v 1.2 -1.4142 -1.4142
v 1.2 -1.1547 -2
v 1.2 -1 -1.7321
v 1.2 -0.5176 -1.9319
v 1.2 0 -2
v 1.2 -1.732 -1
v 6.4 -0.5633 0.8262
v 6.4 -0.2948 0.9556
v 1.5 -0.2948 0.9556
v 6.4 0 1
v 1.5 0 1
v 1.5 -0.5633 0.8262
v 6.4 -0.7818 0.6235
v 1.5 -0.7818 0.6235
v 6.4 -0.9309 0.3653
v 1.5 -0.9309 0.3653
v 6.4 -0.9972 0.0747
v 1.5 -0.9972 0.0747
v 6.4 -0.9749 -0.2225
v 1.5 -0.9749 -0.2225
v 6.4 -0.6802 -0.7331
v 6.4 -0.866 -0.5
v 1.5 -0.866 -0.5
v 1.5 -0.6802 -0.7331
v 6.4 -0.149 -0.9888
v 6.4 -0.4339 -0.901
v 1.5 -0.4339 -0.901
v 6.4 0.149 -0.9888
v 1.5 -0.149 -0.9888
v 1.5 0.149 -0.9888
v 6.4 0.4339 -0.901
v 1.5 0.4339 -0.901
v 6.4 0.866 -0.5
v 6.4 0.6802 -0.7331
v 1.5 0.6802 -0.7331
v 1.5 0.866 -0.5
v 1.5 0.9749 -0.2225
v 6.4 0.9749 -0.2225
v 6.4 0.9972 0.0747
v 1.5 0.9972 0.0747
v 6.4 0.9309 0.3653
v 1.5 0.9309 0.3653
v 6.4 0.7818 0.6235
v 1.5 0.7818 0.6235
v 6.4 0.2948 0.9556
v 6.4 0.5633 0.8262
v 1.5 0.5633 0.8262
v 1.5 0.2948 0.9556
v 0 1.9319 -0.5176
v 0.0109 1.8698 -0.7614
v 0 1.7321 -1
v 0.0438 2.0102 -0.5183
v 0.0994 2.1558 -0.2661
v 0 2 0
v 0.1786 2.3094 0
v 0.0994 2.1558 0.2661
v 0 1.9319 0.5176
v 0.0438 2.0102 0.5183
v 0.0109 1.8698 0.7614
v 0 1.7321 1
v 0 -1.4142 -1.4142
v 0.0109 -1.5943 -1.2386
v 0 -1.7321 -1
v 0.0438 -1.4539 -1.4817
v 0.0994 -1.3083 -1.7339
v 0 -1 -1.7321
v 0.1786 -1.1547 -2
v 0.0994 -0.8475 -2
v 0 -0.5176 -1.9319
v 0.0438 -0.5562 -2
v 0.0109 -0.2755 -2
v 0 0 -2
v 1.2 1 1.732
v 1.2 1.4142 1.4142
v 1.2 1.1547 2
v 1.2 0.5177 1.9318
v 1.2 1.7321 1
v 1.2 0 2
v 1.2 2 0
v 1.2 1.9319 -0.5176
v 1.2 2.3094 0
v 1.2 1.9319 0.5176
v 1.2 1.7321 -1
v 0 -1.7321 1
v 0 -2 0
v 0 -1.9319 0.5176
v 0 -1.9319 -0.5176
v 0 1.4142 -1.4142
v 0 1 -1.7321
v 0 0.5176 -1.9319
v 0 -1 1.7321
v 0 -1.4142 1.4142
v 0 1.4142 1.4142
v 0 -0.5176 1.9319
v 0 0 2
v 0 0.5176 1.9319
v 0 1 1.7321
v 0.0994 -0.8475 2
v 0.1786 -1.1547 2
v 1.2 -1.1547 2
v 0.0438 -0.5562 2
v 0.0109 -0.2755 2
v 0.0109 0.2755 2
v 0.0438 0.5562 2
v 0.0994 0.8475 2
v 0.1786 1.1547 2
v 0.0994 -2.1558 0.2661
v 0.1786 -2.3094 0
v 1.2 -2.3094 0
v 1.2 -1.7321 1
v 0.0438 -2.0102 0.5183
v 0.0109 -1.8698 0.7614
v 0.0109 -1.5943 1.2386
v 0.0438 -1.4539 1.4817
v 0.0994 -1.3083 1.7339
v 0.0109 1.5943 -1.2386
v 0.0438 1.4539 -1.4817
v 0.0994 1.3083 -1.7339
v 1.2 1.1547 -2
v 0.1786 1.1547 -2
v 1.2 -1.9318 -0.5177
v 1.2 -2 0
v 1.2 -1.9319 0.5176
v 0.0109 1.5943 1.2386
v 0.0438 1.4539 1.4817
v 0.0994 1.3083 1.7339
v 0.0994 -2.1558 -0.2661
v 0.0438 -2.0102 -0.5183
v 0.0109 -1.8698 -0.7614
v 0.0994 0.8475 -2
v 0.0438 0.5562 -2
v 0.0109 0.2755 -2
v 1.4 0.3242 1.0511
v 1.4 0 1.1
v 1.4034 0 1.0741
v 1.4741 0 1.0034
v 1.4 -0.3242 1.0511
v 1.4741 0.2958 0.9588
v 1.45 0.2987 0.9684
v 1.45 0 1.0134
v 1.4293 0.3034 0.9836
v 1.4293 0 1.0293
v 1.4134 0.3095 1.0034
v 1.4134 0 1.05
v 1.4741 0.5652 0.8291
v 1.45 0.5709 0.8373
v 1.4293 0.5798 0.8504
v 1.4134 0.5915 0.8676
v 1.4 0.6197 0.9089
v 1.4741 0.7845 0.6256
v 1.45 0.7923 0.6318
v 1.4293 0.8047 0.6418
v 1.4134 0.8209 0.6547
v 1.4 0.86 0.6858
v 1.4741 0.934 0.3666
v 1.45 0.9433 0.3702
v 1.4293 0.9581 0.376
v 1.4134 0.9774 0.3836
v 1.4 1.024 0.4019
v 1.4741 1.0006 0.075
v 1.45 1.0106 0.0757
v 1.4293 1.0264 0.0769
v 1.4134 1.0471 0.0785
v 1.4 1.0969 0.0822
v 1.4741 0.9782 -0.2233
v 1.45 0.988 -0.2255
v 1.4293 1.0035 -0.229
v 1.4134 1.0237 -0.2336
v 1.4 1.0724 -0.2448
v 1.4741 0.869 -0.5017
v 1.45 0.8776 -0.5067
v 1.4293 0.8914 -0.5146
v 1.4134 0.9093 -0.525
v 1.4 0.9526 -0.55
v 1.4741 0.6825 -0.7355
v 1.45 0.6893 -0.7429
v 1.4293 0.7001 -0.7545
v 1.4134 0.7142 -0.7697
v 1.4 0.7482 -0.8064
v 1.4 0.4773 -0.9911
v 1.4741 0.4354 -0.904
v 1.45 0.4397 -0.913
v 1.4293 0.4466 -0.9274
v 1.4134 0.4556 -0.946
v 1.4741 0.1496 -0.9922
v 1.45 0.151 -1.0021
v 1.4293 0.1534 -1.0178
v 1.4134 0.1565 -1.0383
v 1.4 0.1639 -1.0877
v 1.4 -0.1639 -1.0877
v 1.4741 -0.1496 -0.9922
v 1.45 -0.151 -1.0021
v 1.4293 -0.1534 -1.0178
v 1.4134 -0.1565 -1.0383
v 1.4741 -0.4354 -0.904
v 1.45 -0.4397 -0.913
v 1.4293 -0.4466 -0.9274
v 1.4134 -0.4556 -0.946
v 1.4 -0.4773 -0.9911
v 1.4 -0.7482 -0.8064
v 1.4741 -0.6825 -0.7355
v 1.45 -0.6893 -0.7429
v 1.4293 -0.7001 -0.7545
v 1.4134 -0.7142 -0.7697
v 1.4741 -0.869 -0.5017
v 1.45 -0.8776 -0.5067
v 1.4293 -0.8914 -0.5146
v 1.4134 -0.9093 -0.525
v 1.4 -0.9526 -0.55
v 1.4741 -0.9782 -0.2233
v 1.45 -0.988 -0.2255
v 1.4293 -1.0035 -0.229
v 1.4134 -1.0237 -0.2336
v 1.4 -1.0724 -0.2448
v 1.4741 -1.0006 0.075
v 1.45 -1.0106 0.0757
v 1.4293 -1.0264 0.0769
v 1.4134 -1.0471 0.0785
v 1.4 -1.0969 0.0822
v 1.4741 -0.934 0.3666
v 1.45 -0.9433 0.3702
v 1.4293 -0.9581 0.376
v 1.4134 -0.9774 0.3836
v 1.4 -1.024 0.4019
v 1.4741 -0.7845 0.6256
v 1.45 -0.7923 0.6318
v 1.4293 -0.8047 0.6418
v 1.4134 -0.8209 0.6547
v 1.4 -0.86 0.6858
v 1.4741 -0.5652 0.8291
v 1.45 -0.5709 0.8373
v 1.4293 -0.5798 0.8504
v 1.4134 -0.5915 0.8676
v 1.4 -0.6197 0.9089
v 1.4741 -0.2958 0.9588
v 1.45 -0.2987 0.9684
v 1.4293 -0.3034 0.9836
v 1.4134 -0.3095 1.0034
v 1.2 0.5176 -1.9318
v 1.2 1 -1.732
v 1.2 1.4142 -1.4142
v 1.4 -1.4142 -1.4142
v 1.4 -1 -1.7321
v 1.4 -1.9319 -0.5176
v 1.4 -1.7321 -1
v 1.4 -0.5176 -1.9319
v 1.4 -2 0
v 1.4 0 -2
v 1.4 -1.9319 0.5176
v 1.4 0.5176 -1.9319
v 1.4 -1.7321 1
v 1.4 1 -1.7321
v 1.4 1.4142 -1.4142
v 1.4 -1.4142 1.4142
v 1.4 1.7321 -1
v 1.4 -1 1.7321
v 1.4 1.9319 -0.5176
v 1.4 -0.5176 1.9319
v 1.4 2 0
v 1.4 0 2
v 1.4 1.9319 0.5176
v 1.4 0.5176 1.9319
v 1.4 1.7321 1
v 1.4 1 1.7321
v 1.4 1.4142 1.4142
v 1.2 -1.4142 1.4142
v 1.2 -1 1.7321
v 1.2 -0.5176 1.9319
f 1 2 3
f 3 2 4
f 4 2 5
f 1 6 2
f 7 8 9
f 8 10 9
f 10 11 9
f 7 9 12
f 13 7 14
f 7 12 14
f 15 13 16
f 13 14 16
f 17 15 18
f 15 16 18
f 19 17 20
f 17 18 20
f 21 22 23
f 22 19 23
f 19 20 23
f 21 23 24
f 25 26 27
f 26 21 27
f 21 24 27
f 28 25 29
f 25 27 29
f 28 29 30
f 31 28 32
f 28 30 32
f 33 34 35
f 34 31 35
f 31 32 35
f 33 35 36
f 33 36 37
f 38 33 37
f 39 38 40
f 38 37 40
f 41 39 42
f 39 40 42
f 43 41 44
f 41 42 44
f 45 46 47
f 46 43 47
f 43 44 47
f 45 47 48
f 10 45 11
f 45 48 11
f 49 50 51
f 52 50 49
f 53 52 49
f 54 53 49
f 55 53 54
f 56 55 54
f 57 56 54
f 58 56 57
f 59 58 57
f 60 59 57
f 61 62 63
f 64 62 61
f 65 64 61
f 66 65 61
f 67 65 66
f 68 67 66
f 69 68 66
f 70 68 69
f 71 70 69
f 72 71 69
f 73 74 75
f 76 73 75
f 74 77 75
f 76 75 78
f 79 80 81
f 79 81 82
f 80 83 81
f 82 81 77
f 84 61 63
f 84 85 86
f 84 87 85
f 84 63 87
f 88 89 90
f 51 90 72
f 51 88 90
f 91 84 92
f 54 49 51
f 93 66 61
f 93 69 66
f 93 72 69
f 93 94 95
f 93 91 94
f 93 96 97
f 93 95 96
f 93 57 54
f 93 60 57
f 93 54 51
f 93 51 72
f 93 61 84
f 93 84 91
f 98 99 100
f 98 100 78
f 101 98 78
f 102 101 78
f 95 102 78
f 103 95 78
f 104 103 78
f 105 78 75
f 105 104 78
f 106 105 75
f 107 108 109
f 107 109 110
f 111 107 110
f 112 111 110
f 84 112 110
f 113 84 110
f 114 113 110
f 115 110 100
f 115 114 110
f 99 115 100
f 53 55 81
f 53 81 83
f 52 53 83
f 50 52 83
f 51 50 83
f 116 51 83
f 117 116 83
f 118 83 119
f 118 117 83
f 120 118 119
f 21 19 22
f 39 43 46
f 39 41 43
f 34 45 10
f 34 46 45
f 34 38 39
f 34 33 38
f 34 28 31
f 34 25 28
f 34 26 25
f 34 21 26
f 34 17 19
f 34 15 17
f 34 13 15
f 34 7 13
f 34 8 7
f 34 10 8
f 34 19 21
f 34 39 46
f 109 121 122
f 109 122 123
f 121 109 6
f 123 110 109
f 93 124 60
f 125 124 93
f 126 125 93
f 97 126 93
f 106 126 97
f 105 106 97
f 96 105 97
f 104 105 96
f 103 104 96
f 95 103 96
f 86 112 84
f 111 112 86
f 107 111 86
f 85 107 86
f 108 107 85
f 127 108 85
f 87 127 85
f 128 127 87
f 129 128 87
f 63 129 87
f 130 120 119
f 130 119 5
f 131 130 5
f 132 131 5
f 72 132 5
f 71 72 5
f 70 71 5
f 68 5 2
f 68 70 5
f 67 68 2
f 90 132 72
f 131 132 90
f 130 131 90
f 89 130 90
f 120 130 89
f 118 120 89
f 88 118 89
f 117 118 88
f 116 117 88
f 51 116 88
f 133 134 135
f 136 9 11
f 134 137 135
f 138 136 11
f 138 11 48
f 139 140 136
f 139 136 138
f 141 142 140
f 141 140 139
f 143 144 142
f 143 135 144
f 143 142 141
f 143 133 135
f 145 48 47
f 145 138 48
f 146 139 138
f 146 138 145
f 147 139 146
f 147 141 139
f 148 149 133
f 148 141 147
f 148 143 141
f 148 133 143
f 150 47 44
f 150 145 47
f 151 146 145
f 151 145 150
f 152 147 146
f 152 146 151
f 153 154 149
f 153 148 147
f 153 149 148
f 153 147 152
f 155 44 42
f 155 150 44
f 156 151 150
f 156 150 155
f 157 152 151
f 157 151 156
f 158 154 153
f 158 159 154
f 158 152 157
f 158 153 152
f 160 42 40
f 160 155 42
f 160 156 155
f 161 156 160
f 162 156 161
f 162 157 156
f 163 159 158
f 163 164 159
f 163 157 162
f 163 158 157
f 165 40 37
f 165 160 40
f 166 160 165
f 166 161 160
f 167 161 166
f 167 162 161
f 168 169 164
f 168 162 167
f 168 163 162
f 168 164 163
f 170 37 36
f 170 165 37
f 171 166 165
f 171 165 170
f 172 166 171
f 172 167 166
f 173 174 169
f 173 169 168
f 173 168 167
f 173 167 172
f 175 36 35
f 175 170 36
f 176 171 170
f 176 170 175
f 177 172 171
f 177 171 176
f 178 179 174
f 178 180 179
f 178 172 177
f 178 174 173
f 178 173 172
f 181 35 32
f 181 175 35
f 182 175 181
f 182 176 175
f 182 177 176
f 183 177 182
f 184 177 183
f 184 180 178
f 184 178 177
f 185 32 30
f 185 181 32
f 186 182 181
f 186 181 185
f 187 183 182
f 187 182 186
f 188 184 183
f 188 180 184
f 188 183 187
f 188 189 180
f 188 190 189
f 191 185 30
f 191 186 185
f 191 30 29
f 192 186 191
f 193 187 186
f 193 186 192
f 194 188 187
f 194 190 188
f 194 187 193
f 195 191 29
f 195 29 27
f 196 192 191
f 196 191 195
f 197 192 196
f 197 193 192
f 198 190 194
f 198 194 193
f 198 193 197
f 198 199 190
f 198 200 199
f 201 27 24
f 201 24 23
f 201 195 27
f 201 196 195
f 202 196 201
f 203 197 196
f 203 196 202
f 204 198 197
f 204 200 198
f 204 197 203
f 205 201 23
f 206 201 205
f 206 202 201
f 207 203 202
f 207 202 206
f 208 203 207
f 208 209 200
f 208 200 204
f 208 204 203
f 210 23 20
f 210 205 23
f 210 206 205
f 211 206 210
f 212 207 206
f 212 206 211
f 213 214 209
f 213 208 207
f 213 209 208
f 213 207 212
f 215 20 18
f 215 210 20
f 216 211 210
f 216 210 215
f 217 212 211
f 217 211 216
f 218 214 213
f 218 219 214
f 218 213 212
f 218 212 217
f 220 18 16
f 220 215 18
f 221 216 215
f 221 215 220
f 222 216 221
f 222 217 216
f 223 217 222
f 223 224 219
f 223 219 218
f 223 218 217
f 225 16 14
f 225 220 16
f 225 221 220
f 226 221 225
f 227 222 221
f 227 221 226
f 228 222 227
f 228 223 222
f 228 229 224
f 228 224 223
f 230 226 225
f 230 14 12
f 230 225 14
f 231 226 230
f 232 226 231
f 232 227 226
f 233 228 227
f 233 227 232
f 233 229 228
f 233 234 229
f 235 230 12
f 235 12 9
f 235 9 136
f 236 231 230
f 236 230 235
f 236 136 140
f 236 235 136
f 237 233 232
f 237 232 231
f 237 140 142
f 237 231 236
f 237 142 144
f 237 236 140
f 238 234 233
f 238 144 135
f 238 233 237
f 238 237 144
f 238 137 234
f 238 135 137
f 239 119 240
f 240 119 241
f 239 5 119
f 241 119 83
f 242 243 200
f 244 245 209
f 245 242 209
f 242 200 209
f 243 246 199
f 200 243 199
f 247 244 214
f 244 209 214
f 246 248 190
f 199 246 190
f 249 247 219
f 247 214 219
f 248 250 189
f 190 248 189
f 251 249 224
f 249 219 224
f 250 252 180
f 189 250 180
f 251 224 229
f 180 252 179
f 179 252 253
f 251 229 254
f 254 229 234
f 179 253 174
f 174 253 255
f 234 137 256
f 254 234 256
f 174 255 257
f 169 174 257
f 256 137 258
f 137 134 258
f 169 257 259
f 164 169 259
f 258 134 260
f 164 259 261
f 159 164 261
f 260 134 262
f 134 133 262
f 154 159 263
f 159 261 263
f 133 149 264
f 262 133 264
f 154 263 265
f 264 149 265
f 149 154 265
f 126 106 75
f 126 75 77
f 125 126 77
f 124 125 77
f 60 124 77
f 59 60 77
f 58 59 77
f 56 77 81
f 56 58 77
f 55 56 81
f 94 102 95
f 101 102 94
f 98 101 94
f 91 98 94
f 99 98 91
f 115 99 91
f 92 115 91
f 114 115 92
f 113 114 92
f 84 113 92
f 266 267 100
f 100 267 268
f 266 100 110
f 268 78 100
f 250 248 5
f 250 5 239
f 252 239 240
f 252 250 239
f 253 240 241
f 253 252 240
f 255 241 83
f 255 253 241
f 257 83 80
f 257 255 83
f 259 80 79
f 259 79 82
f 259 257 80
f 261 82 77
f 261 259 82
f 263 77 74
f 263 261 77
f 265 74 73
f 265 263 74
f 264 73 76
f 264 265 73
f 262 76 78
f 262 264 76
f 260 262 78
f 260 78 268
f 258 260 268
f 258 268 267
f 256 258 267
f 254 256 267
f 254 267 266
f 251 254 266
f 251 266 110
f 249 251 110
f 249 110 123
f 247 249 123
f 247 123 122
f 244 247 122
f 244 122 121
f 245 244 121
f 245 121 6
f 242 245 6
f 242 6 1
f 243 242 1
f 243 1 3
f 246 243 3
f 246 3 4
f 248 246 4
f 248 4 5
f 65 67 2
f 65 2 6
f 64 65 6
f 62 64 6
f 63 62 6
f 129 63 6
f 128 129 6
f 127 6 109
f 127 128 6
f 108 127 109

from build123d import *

# Parameters (mm, degrees)
EXTRUDE_364_DEPTH   = 1.4
SKETCH_4_W          = 0.2
SKETCH_4_H          = 10.309401077
CHAMFER_2035_SIZE   = 0.32
FILLET_2080_R       = 0.1
SKETCH_7_R          = 1.592949274
CUT_EXTRUDE_1_DEPTH = 15


with BuildPart() as part:
    # 草图1 → Extrude 364 (new body)
    with BuildSketch(Plane(origin=(0, 0, 0), x_dir=(0, 0, -1), z_dir=(1, 0, 0))):
        Polygon((2, 1.154700538), (2, -1.154700538), (0, -2.309401077), (-2, -1.154700538), (-2, 1.154700538), (0, 2.309401077), align=None)
    extrude(amount=EXTRUDE_364_DEPTH)

    # 草图2 → 凸台-旋转1 (revolve)
    with BuildSketch(Plane.XY, mode=Mode.PRIVATE) as revolve_1_sk:
        Polygon((0, 0), (21.4, 0), (21.4, 0.6536), (21.4, 1), (7.791693541, 1), (0, 1), align=None)
    revolve(revolve_1_sk.sketch.rotate(Axis((0, 0, 0), (1, 0, 0)), 90), axis=Axis((0, 0, 0), (1, 0, 0)))

    # 草图3 → 切除-旋转1 (revolve, cut)
    with BuildSketch(Plane.XY):
        Polygon((0, 2), (3.065384141, 7.309401077), (3.065384141, 12.309401077), (-10, 12.309401077), (-10, 2), align=None)
    revolve(axis=Axis((0, 0, 0), (1, 0, 0)), mode=Mode.SUBTRACT)

    # 草图5 → 切除-旋转2 (revolve, cut)
    with BuildSketch(Plane.XY):
        Polygon((1.4, 2), (-1.665384141, 7.309401077), (-1.665384141, 12.309401077), (8.334615859, 12.309401077), (8.334615859, 2), align=None)
    revolve(axis=Axis((0, 0, 0), (1, 0, 0)), mode=Mode.SUBTRACT)

    # 草图4 → 切除-旋转3 (revolve, cut)
    with BuildSketch(Plane.XY, mode=Mode.PRIVATE) as cut_revolve_3_sk:
        with Locations((1.3, 7.154700539)):
            Rectangle(SKETCH_4_W, SKETCH_4_H)
    revolve(cut_revolve_3_sk.sketch.rotate(Axis((0, 0, 0), (1, 0, 0)), 270), axis=Axis((0, 0, 0), (1, 0, 0)), mode=Mode.SUBTRACT)

    # Chamfer 2035
    chamfer_2035_edges = [part.edges().sort_by_distance(p)[0] for p in [
        (21.4, 0, -1),
    ]]
    chamfer(chamfer_2035_edges, length=CHAMFER_2035_SIZE)

    # Fillet 2080
    fillet_2080_edges = [part.edges().sort_by_distance(p)[0] for p in [
        (1.4, 0, -1),
    ]]
    fillet(fillet_2080_edges, radius=FILLET_2080_R)

    # 草图7 → 切除-拉伸1 (cut)
    with BuildSketch(Plane(origin=(21.4, 0, 0), x_dir=(0, 0, -1), z_dir=(1, 0, 0))):
        Circle(SKETCH_7_R)
    extrude(amount=-CUT_EXTRUDE_1_DEPTH, mode=Mode.SUBTRACT)


solid = part.part
